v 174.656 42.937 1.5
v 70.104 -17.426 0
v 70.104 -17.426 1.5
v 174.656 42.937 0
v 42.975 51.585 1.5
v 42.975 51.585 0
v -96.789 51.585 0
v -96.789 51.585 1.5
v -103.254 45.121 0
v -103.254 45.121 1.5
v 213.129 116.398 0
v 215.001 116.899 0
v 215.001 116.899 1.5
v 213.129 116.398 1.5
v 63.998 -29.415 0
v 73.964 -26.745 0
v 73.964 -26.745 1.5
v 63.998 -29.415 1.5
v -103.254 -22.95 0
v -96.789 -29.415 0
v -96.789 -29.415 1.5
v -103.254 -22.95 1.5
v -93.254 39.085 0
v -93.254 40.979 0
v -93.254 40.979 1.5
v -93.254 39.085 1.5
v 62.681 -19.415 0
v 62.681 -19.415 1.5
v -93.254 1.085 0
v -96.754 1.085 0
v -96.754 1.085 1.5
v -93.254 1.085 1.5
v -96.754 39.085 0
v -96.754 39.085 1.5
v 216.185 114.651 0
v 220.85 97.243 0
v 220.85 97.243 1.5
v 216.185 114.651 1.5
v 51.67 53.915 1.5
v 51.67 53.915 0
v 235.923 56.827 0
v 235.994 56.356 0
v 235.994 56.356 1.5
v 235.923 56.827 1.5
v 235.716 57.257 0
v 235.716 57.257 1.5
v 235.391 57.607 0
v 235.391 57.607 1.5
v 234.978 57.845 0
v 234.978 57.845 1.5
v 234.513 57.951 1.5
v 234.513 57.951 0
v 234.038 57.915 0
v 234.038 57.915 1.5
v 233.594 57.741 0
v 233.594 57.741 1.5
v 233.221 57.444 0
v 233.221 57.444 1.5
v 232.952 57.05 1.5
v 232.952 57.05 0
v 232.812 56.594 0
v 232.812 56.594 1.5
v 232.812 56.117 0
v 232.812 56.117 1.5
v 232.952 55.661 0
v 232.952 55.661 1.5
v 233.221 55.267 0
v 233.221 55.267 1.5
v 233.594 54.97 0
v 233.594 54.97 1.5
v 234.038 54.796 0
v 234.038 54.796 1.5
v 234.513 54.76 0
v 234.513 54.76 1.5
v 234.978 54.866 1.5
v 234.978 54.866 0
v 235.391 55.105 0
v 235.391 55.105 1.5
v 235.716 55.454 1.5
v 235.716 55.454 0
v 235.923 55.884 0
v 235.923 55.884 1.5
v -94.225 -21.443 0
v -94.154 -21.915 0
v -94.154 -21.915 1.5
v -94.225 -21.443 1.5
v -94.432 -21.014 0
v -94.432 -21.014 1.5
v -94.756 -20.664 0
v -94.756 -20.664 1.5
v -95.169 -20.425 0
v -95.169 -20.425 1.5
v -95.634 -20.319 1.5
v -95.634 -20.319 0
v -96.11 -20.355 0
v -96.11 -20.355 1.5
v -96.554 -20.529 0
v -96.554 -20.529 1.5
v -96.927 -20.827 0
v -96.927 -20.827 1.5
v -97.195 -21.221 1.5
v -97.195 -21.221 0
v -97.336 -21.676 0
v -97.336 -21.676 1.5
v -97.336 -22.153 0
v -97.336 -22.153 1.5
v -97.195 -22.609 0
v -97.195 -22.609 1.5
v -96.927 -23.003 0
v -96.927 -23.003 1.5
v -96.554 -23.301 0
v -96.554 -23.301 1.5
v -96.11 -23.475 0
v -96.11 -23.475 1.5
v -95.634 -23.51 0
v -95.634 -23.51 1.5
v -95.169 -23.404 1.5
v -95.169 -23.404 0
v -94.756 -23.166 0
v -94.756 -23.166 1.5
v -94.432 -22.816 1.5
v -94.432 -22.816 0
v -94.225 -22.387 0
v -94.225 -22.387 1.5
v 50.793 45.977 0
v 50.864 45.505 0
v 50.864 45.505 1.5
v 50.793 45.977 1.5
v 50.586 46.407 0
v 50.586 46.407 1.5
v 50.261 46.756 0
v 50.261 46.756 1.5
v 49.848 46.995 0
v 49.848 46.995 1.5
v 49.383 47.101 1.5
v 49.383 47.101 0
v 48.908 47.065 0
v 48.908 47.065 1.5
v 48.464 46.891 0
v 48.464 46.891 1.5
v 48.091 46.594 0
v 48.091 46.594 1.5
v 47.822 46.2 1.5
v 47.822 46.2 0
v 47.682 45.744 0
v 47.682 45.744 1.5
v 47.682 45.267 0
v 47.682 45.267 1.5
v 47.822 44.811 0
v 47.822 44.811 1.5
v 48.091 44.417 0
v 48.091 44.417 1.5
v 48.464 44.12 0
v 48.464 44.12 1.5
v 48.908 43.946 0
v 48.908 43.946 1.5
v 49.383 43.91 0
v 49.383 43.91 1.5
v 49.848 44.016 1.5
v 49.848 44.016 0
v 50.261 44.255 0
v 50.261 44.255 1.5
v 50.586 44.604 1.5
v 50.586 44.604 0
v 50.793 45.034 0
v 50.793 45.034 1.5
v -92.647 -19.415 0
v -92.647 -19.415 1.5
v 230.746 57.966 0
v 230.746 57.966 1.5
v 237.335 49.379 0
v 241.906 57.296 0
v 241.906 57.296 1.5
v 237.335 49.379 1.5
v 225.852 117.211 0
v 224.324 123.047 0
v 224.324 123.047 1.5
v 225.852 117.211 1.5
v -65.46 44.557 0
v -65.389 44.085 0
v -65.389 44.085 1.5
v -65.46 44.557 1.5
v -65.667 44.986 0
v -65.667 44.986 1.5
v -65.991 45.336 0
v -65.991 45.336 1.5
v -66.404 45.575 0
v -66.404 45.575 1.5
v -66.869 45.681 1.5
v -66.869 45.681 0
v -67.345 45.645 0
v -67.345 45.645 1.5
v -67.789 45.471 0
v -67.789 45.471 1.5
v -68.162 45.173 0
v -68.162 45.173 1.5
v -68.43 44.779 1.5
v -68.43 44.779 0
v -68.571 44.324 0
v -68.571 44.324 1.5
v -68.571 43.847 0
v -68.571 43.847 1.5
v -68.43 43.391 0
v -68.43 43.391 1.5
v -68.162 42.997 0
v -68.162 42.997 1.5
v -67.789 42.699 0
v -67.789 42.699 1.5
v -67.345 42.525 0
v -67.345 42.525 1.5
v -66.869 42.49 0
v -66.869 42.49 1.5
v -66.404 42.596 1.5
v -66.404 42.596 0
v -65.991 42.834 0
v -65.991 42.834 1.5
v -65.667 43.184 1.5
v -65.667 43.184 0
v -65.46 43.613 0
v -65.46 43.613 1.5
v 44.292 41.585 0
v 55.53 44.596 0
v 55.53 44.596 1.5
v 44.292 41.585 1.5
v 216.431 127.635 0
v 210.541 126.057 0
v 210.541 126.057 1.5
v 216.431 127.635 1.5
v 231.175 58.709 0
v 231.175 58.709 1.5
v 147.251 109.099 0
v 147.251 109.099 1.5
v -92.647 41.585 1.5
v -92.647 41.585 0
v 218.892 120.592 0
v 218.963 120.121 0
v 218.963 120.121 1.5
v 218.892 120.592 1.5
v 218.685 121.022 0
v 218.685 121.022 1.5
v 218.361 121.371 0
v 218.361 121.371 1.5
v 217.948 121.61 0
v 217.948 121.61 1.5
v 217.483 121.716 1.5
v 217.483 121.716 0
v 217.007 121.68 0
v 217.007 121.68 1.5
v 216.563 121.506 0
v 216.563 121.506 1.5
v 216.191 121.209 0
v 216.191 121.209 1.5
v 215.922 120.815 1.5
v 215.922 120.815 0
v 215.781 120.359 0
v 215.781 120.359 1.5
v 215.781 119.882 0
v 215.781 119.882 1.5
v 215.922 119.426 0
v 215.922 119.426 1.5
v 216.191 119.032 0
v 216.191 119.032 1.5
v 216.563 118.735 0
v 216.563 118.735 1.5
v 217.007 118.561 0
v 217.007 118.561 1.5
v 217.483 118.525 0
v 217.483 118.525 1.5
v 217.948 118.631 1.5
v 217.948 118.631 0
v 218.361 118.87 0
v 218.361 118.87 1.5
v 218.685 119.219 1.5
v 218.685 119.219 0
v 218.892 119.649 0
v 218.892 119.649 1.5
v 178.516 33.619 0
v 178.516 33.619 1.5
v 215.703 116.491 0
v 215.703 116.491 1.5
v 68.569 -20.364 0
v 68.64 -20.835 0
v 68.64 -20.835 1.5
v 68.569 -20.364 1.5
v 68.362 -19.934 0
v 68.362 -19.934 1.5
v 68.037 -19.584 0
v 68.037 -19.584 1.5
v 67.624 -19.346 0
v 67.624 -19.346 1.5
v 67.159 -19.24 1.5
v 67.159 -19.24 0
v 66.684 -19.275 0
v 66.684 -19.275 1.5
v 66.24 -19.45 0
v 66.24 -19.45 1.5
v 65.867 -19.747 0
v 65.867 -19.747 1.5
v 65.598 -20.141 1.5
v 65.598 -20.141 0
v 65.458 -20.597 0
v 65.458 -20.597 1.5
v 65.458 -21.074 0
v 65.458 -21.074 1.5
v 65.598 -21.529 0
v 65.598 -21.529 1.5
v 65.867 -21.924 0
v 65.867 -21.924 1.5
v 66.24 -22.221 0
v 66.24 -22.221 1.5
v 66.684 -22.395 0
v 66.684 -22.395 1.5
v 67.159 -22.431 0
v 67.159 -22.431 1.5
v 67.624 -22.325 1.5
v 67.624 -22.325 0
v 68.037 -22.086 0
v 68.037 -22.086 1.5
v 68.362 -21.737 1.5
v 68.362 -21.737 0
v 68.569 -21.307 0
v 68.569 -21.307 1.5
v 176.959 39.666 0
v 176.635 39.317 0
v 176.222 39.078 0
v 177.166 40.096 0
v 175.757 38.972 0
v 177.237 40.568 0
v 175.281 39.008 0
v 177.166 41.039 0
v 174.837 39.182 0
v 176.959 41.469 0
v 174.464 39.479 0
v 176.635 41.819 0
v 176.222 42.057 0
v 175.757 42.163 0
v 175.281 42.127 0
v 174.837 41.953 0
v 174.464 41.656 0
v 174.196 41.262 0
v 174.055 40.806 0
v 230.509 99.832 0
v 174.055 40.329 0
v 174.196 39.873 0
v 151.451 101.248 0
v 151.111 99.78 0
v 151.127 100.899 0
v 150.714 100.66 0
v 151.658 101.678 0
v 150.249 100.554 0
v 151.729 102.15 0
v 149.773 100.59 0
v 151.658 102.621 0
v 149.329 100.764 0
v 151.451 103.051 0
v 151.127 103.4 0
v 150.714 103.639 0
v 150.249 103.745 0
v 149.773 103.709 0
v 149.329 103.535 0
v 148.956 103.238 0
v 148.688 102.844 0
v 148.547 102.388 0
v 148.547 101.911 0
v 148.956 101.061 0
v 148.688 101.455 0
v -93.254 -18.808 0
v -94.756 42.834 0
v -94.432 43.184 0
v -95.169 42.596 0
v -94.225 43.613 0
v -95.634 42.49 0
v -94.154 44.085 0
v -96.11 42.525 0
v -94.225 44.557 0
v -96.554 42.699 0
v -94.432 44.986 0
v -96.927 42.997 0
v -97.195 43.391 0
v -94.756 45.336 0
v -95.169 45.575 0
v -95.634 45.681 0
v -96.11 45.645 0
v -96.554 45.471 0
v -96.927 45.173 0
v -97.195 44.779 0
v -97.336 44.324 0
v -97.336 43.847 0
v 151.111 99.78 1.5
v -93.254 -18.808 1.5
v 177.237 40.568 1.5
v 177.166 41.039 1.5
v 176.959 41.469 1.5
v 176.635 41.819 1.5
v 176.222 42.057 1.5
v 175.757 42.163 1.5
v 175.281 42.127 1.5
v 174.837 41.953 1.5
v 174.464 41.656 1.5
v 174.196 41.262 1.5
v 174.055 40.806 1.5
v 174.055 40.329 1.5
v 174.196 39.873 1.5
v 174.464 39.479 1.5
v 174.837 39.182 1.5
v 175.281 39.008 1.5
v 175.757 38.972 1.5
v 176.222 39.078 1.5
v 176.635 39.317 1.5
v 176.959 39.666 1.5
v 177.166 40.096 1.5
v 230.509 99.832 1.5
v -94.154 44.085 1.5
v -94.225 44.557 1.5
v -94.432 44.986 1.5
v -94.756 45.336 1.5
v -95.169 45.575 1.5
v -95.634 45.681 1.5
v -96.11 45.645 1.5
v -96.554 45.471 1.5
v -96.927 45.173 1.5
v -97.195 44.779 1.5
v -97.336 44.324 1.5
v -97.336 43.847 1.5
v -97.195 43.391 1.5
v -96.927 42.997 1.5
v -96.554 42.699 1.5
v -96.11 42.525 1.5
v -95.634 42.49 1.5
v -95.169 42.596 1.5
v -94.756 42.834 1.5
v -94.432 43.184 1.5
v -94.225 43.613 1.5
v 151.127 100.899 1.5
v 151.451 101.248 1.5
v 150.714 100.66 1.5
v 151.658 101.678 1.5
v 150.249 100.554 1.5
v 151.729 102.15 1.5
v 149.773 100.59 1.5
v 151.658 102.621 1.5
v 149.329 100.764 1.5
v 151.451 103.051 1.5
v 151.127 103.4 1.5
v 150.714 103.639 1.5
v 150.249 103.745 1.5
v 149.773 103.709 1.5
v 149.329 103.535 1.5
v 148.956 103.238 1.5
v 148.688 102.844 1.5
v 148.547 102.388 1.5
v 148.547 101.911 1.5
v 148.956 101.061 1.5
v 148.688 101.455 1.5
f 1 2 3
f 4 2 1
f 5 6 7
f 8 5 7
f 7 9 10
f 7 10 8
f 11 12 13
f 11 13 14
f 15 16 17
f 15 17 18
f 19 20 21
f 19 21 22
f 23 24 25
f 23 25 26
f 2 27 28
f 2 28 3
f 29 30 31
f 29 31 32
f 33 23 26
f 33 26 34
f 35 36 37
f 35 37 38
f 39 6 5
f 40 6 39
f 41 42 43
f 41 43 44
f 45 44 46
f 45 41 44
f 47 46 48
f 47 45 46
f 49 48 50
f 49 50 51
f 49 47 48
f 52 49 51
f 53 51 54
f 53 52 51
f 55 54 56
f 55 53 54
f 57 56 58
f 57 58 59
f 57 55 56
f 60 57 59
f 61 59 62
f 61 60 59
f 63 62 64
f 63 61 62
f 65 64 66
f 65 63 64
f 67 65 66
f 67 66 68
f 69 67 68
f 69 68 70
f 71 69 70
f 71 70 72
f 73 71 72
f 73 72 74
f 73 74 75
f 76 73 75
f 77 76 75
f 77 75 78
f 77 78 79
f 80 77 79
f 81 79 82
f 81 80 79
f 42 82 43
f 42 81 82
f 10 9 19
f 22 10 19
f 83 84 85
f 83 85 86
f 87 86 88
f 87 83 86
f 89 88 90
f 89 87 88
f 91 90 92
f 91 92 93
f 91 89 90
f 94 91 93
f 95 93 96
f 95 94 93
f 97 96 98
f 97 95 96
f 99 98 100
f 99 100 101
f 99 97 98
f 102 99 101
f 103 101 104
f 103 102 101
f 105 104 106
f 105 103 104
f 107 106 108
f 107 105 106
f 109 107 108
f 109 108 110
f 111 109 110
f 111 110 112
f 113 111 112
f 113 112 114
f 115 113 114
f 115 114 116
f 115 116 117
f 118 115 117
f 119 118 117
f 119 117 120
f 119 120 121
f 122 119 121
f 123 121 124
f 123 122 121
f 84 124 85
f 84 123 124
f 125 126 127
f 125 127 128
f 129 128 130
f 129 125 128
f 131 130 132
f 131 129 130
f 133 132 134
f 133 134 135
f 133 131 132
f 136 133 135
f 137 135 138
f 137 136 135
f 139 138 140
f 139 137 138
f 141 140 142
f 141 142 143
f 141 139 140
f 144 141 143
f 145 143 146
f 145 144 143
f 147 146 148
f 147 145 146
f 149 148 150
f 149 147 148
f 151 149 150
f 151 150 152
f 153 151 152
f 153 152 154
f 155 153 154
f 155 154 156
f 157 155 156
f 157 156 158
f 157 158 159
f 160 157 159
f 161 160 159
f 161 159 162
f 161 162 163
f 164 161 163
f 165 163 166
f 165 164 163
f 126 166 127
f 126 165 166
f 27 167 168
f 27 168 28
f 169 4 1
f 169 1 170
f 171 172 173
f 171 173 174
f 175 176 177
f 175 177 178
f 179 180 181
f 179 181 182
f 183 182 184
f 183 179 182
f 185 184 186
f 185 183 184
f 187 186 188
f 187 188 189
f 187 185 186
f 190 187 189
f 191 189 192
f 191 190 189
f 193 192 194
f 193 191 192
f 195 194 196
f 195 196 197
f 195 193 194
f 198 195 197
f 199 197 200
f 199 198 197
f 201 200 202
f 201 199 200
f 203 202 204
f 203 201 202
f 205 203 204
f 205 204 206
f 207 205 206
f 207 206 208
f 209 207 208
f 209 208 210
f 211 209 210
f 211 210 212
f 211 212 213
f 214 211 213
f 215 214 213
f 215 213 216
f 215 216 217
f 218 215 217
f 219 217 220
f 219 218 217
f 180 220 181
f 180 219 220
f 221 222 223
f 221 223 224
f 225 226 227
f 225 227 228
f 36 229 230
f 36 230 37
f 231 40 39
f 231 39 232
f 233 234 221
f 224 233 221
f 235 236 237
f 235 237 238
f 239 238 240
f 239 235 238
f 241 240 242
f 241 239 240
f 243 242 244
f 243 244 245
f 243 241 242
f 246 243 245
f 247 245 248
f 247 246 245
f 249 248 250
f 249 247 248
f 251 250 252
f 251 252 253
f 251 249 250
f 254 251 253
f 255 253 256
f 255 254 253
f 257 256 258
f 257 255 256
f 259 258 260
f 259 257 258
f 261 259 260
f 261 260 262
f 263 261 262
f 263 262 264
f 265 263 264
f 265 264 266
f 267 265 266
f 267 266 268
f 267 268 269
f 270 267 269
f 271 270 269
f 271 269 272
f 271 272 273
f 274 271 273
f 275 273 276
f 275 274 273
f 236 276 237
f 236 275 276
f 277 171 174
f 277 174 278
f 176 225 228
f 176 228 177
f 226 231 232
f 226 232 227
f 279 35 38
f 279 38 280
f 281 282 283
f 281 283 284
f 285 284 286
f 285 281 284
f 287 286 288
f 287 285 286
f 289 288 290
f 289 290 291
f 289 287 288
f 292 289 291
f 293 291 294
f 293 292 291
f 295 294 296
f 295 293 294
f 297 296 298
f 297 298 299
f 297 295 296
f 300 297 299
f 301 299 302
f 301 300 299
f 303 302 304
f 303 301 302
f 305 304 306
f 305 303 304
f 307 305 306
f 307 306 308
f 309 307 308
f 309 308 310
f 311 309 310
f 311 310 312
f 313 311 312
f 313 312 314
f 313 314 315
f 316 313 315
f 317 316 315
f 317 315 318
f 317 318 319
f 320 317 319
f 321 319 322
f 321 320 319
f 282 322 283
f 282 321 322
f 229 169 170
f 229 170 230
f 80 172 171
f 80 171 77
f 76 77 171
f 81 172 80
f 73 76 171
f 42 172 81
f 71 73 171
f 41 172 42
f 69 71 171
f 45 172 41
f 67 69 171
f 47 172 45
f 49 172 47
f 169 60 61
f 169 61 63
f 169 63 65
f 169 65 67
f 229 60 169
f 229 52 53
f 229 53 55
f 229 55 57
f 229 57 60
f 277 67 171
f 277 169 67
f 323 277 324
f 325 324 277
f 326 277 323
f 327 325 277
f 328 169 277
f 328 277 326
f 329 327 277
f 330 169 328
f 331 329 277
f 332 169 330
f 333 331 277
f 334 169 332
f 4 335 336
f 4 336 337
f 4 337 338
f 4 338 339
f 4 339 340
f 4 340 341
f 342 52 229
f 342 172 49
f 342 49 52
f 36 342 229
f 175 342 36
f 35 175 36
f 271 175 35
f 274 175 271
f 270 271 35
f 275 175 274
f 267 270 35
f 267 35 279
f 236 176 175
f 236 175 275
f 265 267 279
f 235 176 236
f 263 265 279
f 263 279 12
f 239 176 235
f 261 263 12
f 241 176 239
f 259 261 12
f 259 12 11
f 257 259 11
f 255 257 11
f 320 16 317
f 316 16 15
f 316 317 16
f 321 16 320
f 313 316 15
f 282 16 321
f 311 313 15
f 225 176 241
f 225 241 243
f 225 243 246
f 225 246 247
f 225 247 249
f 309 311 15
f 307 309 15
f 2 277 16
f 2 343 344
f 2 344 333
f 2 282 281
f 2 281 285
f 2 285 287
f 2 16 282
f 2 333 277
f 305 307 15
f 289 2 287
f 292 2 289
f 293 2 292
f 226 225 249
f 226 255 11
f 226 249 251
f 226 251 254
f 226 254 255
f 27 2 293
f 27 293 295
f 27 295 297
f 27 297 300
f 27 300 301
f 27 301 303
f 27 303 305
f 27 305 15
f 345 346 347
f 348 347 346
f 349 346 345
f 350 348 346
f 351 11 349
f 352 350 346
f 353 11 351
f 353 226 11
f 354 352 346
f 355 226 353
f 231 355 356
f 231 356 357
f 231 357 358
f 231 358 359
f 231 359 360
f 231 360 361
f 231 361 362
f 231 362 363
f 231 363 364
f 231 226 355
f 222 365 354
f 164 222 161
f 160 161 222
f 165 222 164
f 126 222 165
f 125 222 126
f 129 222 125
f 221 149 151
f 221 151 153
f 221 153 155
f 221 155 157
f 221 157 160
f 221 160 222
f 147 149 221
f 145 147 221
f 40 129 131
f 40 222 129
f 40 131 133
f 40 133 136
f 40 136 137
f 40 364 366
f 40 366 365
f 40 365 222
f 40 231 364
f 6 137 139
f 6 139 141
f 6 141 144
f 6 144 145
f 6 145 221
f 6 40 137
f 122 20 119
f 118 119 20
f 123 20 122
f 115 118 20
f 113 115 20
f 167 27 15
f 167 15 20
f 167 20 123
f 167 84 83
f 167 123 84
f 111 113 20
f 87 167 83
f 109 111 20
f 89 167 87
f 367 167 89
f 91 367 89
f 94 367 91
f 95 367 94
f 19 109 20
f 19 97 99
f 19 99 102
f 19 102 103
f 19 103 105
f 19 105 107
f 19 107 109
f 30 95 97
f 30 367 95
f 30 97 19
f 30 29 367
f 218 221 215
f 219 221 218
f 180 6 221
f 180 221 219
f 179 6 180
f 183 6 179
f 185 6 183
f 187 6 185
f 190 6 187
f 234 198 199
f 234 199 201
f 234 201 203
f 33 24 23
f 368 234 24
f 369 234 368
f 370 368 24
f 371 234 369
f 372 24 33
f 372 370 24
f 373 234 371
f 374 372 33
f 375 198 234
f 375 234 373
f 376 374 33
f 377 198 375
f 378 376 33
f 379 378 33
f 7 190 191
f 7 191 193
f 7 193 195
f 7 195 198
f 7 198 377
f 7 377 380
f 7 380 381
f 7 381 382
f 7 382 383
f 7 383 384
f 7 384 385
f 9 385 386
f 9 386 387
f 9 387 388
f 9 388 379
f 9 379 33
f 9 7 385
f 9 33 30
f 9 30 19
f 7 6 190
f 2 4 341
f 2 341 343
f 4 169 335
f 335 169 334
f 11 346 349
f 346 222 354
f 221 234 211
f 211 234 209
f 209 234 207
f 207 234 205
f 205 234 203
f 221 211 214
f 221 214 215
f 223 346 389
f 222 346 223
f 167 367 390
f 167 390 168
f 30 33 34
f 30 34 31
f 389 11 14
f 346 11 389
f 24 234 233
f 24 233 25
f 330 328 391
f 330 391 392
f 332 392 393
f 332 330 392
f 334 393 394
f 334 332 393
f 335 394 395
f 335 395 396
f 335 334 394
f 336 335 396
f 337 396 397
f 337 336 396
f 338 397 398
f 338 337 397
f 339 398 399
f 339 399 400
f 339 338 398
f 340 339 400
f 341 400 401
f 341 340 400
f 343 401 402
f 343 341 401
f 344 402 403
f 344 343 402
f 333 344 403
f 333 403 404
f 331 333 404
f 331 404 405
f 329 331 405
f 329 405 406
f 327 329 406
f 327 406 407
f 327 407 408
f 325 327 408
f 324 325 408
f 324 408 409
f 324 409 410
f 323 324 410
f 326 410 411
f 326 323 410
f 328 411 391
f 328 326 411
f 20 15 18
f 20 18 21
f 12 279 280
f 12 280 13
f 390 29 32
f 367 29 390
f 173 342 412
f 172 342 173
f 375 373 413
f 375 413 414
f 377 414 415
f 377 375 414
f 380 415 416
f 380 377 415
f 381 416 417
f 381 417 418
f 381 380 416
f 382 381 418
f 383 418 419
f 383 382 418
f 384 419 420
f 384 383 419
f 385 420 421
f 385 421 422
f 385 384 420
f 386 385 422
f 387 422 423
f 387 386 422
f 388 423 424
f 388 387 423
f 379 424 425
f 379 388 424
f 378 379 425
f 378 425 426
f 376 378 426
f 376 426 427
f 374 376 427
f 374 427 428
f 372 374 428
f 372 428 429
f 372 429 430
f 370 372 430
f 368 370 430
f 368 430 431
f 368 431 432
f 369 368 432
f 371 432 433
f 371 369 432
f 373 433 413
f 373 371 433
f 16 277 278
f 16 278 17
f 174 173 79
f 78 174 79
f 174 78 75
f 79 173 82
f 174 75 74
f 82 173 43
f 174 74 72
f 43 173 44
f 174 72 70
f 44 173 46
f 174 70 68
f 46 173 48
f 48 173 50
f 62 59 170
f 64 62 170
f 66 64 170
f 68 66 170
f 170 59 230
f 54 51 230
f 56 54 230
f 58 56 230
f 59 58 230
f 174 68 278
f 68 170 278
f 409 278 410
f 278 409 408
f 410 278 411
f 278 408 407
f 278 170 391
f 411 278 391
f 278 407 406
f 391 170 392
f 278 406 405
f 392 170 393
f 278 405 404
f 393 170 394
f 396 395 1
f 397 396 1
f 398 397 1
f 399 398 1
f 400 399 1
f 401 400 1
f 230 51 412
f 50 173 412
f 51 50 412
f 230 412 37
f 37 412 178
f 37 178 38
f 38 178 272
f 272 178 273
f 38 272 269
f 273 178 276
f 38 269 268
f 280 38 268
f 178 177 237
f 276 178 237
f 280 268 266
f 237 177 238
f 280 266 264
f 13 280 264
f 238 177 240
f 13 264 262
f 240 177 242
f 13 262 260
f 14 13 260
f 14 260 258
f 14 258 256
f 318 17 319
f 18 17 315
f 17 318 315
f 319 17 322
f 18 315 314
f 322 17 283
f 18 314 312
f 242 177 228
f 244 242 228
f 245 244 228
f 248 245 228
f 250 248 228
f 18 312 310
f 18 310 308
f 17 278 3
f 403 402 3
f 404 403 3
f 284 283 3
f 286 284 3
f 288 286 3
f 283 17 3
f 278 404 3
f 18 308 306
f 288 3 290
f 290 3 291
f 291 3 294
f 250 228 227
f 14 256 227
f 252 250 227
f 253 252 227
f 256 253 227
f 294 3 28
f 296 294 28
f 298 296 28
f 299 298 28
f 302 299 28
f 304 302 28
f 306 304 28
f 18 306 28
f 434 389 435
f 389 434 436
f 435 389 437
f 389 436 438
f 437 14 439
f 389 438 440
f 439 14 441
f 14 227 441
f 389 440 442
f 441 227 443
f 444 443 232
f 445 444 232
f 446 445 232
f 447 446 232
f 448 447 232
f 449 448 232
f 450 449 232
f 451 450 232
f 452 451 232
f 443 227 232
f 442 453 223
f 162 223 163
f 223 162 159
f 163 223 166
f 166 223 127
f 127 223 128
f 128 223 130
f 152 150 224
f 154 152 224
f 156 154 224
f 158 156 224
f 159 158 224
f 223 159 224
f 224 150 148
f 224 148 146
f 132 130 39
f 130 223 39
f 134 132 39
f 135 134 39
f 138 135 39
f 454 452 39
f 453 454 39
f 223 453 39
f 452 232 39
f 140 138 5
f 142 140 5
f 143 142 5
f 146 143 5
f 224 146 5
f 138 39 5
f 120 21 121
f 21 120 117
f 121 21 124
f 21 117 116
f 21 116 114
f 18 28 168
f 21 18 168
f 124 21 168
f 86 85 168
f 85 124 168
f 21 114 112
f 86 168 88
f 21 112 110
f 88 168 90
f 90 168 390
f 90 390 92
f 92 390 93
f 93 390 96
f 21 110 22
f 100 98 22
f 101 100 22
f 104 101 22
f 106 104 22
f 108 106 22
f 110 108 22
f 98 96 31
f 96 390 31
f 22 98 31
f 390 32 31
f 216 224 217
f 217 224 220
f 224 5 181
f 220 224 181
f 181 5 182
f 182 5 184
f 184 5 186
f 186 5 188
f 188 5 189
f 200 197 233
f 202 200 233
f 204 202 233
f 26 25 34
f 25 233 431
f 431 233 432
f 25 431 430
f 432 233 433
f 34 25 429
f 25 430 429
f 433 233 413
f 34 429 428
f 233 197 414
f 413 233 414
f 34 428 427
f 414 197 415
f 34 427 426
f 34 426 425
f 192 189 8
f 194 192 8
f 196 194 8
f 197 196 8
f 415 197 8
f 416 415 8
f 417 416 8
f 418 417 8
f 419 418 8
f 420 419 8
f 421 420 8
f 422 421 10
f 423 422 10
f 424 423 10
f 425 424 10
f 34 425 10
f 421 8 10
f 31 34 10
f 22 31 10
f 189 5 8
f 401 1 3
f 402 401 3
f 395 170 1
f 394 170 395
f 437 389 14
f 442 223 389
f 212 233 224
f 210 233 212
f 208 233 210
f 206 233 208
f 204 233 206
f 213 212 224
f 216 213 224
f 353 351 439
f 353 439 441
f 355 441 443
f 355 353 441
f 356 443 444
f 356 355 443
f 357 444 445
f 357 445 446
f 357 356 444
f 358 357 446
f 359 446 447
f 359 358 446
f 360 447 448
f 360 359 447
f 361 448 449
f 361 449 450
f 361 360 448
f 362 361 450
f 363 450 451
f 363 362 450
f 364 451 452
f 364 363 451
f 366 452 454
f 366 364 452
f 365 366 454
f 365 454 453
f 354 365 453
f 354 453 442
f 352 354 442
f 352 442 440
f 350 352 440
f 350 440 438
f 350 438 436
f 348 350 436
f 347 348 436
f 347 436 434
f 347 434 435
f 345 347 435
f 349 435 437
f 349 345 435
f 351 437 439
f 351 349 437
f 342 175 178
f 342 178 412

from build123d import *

# Parameters (mm, degrees)
ESQUISSE1_R        = 1.6
BOSS_EXTRU_1_DEPTH = 1.5


with BuildPart() as part:
    # Esquisse1 → Boss.-Extru.1 (new body)
    with BuildSketch(Plane.XY):
        Polygon((-75.988646329, 51.585106383), (42.975455994, 51.585106383), (51.669750275, 53.914735514), (147.250925797, 109.098552931), (210.540810955, 126.057026549), (216.43052053, 127.635169473), (224.324263617, 123.047292559), (225.851989006, 117.211223452), (230.508864659, 99.83152691), (241.906099495, 57.296467436), (237.335031683, 49.379145741), (178.515758799, 33.618569072), (73.963816863, -26.744522748), (63.997857106, -29.414893617), (-96.789296468, -29.414893617), (-103.253762562, -22.950427523), (-103.253762562, 35.79522772), (-103.253762562, 45.120640289), (-96.789296468, 51.585106383), align=None)
        with Locations((-95.753762562, 44.085106383)):
            Circle(ESQUISSE1_R, mode=Mode.SUBTRACT)
        with Locations((-66.988646329, 44.085106383)):
            Circle(ESQUISSE1_R, mode=Mode.SUBTRACT)
        with Locations((-95.753762562, -21.914893617)):
            Circle(ESQUISSE1_R, mode=Mode.SUBTRACT)
        with Locations((67.039694146, -20.835264486)):
            Circle(ESQUISSE1_R, mode=Mode.SUBTRACT)
        with Locations((49.263745973, 45.505477252)):
            Circle(ESQUISSE1_R, mode=Mode.SUBTRACT)
        with Locations((175.637377655, 40.567595866)):
            Circle(ESQUISSE1_R, mode=Mode.SUBTRACT)
        with Locations((150.12930694, 102.149526137)):
            Circle(ESQUISSE1_R, mode=Mode.SUBTRACT)
        with Locations((217.363403759, 120.120565138)):
            Circle(ESQUISSE1_R, mode=Mode.SUBTRACT)
        with Locations((234.393639901, 56.355573542)):
            Circle(ESQUISSE1_R, mode=Mode.SUBTRACT)
        Polygon((-93.253762562, 39.085106383), (-96.753762562, 39.085106383), (-96.753762562, 1.085106383), (-93.253762562, 1.085106383), (-93.253762562, -18.808291899), (-92.647160844, -19.414893617), (62.681332131, -19.414893617), (70.103960937, -17.426006223), (174.655902873, 42.937085598), (230.745845457, 57.966340417), (231.174777645, 58.70927276), (220.849606396, 97.243336459), (216.185262108, 114.650906326), (215.703467251, 116.491412548), (215.001377661, 116.899469991), (213.129001406, 116.397768286), (151.110781723, 99.780036406), (55.529606201, 44.596218989), (44.29198097, 41.585106383), (-75.988646329, 41.585106383), (-92.647160844, 41.585106383), (-93.253762562, 40.978504665), align=None, mode=Mode.SUBTRACT)
    extrude(amount=BOSS_EXTRU_1_DEPTH)


solid = part.part
